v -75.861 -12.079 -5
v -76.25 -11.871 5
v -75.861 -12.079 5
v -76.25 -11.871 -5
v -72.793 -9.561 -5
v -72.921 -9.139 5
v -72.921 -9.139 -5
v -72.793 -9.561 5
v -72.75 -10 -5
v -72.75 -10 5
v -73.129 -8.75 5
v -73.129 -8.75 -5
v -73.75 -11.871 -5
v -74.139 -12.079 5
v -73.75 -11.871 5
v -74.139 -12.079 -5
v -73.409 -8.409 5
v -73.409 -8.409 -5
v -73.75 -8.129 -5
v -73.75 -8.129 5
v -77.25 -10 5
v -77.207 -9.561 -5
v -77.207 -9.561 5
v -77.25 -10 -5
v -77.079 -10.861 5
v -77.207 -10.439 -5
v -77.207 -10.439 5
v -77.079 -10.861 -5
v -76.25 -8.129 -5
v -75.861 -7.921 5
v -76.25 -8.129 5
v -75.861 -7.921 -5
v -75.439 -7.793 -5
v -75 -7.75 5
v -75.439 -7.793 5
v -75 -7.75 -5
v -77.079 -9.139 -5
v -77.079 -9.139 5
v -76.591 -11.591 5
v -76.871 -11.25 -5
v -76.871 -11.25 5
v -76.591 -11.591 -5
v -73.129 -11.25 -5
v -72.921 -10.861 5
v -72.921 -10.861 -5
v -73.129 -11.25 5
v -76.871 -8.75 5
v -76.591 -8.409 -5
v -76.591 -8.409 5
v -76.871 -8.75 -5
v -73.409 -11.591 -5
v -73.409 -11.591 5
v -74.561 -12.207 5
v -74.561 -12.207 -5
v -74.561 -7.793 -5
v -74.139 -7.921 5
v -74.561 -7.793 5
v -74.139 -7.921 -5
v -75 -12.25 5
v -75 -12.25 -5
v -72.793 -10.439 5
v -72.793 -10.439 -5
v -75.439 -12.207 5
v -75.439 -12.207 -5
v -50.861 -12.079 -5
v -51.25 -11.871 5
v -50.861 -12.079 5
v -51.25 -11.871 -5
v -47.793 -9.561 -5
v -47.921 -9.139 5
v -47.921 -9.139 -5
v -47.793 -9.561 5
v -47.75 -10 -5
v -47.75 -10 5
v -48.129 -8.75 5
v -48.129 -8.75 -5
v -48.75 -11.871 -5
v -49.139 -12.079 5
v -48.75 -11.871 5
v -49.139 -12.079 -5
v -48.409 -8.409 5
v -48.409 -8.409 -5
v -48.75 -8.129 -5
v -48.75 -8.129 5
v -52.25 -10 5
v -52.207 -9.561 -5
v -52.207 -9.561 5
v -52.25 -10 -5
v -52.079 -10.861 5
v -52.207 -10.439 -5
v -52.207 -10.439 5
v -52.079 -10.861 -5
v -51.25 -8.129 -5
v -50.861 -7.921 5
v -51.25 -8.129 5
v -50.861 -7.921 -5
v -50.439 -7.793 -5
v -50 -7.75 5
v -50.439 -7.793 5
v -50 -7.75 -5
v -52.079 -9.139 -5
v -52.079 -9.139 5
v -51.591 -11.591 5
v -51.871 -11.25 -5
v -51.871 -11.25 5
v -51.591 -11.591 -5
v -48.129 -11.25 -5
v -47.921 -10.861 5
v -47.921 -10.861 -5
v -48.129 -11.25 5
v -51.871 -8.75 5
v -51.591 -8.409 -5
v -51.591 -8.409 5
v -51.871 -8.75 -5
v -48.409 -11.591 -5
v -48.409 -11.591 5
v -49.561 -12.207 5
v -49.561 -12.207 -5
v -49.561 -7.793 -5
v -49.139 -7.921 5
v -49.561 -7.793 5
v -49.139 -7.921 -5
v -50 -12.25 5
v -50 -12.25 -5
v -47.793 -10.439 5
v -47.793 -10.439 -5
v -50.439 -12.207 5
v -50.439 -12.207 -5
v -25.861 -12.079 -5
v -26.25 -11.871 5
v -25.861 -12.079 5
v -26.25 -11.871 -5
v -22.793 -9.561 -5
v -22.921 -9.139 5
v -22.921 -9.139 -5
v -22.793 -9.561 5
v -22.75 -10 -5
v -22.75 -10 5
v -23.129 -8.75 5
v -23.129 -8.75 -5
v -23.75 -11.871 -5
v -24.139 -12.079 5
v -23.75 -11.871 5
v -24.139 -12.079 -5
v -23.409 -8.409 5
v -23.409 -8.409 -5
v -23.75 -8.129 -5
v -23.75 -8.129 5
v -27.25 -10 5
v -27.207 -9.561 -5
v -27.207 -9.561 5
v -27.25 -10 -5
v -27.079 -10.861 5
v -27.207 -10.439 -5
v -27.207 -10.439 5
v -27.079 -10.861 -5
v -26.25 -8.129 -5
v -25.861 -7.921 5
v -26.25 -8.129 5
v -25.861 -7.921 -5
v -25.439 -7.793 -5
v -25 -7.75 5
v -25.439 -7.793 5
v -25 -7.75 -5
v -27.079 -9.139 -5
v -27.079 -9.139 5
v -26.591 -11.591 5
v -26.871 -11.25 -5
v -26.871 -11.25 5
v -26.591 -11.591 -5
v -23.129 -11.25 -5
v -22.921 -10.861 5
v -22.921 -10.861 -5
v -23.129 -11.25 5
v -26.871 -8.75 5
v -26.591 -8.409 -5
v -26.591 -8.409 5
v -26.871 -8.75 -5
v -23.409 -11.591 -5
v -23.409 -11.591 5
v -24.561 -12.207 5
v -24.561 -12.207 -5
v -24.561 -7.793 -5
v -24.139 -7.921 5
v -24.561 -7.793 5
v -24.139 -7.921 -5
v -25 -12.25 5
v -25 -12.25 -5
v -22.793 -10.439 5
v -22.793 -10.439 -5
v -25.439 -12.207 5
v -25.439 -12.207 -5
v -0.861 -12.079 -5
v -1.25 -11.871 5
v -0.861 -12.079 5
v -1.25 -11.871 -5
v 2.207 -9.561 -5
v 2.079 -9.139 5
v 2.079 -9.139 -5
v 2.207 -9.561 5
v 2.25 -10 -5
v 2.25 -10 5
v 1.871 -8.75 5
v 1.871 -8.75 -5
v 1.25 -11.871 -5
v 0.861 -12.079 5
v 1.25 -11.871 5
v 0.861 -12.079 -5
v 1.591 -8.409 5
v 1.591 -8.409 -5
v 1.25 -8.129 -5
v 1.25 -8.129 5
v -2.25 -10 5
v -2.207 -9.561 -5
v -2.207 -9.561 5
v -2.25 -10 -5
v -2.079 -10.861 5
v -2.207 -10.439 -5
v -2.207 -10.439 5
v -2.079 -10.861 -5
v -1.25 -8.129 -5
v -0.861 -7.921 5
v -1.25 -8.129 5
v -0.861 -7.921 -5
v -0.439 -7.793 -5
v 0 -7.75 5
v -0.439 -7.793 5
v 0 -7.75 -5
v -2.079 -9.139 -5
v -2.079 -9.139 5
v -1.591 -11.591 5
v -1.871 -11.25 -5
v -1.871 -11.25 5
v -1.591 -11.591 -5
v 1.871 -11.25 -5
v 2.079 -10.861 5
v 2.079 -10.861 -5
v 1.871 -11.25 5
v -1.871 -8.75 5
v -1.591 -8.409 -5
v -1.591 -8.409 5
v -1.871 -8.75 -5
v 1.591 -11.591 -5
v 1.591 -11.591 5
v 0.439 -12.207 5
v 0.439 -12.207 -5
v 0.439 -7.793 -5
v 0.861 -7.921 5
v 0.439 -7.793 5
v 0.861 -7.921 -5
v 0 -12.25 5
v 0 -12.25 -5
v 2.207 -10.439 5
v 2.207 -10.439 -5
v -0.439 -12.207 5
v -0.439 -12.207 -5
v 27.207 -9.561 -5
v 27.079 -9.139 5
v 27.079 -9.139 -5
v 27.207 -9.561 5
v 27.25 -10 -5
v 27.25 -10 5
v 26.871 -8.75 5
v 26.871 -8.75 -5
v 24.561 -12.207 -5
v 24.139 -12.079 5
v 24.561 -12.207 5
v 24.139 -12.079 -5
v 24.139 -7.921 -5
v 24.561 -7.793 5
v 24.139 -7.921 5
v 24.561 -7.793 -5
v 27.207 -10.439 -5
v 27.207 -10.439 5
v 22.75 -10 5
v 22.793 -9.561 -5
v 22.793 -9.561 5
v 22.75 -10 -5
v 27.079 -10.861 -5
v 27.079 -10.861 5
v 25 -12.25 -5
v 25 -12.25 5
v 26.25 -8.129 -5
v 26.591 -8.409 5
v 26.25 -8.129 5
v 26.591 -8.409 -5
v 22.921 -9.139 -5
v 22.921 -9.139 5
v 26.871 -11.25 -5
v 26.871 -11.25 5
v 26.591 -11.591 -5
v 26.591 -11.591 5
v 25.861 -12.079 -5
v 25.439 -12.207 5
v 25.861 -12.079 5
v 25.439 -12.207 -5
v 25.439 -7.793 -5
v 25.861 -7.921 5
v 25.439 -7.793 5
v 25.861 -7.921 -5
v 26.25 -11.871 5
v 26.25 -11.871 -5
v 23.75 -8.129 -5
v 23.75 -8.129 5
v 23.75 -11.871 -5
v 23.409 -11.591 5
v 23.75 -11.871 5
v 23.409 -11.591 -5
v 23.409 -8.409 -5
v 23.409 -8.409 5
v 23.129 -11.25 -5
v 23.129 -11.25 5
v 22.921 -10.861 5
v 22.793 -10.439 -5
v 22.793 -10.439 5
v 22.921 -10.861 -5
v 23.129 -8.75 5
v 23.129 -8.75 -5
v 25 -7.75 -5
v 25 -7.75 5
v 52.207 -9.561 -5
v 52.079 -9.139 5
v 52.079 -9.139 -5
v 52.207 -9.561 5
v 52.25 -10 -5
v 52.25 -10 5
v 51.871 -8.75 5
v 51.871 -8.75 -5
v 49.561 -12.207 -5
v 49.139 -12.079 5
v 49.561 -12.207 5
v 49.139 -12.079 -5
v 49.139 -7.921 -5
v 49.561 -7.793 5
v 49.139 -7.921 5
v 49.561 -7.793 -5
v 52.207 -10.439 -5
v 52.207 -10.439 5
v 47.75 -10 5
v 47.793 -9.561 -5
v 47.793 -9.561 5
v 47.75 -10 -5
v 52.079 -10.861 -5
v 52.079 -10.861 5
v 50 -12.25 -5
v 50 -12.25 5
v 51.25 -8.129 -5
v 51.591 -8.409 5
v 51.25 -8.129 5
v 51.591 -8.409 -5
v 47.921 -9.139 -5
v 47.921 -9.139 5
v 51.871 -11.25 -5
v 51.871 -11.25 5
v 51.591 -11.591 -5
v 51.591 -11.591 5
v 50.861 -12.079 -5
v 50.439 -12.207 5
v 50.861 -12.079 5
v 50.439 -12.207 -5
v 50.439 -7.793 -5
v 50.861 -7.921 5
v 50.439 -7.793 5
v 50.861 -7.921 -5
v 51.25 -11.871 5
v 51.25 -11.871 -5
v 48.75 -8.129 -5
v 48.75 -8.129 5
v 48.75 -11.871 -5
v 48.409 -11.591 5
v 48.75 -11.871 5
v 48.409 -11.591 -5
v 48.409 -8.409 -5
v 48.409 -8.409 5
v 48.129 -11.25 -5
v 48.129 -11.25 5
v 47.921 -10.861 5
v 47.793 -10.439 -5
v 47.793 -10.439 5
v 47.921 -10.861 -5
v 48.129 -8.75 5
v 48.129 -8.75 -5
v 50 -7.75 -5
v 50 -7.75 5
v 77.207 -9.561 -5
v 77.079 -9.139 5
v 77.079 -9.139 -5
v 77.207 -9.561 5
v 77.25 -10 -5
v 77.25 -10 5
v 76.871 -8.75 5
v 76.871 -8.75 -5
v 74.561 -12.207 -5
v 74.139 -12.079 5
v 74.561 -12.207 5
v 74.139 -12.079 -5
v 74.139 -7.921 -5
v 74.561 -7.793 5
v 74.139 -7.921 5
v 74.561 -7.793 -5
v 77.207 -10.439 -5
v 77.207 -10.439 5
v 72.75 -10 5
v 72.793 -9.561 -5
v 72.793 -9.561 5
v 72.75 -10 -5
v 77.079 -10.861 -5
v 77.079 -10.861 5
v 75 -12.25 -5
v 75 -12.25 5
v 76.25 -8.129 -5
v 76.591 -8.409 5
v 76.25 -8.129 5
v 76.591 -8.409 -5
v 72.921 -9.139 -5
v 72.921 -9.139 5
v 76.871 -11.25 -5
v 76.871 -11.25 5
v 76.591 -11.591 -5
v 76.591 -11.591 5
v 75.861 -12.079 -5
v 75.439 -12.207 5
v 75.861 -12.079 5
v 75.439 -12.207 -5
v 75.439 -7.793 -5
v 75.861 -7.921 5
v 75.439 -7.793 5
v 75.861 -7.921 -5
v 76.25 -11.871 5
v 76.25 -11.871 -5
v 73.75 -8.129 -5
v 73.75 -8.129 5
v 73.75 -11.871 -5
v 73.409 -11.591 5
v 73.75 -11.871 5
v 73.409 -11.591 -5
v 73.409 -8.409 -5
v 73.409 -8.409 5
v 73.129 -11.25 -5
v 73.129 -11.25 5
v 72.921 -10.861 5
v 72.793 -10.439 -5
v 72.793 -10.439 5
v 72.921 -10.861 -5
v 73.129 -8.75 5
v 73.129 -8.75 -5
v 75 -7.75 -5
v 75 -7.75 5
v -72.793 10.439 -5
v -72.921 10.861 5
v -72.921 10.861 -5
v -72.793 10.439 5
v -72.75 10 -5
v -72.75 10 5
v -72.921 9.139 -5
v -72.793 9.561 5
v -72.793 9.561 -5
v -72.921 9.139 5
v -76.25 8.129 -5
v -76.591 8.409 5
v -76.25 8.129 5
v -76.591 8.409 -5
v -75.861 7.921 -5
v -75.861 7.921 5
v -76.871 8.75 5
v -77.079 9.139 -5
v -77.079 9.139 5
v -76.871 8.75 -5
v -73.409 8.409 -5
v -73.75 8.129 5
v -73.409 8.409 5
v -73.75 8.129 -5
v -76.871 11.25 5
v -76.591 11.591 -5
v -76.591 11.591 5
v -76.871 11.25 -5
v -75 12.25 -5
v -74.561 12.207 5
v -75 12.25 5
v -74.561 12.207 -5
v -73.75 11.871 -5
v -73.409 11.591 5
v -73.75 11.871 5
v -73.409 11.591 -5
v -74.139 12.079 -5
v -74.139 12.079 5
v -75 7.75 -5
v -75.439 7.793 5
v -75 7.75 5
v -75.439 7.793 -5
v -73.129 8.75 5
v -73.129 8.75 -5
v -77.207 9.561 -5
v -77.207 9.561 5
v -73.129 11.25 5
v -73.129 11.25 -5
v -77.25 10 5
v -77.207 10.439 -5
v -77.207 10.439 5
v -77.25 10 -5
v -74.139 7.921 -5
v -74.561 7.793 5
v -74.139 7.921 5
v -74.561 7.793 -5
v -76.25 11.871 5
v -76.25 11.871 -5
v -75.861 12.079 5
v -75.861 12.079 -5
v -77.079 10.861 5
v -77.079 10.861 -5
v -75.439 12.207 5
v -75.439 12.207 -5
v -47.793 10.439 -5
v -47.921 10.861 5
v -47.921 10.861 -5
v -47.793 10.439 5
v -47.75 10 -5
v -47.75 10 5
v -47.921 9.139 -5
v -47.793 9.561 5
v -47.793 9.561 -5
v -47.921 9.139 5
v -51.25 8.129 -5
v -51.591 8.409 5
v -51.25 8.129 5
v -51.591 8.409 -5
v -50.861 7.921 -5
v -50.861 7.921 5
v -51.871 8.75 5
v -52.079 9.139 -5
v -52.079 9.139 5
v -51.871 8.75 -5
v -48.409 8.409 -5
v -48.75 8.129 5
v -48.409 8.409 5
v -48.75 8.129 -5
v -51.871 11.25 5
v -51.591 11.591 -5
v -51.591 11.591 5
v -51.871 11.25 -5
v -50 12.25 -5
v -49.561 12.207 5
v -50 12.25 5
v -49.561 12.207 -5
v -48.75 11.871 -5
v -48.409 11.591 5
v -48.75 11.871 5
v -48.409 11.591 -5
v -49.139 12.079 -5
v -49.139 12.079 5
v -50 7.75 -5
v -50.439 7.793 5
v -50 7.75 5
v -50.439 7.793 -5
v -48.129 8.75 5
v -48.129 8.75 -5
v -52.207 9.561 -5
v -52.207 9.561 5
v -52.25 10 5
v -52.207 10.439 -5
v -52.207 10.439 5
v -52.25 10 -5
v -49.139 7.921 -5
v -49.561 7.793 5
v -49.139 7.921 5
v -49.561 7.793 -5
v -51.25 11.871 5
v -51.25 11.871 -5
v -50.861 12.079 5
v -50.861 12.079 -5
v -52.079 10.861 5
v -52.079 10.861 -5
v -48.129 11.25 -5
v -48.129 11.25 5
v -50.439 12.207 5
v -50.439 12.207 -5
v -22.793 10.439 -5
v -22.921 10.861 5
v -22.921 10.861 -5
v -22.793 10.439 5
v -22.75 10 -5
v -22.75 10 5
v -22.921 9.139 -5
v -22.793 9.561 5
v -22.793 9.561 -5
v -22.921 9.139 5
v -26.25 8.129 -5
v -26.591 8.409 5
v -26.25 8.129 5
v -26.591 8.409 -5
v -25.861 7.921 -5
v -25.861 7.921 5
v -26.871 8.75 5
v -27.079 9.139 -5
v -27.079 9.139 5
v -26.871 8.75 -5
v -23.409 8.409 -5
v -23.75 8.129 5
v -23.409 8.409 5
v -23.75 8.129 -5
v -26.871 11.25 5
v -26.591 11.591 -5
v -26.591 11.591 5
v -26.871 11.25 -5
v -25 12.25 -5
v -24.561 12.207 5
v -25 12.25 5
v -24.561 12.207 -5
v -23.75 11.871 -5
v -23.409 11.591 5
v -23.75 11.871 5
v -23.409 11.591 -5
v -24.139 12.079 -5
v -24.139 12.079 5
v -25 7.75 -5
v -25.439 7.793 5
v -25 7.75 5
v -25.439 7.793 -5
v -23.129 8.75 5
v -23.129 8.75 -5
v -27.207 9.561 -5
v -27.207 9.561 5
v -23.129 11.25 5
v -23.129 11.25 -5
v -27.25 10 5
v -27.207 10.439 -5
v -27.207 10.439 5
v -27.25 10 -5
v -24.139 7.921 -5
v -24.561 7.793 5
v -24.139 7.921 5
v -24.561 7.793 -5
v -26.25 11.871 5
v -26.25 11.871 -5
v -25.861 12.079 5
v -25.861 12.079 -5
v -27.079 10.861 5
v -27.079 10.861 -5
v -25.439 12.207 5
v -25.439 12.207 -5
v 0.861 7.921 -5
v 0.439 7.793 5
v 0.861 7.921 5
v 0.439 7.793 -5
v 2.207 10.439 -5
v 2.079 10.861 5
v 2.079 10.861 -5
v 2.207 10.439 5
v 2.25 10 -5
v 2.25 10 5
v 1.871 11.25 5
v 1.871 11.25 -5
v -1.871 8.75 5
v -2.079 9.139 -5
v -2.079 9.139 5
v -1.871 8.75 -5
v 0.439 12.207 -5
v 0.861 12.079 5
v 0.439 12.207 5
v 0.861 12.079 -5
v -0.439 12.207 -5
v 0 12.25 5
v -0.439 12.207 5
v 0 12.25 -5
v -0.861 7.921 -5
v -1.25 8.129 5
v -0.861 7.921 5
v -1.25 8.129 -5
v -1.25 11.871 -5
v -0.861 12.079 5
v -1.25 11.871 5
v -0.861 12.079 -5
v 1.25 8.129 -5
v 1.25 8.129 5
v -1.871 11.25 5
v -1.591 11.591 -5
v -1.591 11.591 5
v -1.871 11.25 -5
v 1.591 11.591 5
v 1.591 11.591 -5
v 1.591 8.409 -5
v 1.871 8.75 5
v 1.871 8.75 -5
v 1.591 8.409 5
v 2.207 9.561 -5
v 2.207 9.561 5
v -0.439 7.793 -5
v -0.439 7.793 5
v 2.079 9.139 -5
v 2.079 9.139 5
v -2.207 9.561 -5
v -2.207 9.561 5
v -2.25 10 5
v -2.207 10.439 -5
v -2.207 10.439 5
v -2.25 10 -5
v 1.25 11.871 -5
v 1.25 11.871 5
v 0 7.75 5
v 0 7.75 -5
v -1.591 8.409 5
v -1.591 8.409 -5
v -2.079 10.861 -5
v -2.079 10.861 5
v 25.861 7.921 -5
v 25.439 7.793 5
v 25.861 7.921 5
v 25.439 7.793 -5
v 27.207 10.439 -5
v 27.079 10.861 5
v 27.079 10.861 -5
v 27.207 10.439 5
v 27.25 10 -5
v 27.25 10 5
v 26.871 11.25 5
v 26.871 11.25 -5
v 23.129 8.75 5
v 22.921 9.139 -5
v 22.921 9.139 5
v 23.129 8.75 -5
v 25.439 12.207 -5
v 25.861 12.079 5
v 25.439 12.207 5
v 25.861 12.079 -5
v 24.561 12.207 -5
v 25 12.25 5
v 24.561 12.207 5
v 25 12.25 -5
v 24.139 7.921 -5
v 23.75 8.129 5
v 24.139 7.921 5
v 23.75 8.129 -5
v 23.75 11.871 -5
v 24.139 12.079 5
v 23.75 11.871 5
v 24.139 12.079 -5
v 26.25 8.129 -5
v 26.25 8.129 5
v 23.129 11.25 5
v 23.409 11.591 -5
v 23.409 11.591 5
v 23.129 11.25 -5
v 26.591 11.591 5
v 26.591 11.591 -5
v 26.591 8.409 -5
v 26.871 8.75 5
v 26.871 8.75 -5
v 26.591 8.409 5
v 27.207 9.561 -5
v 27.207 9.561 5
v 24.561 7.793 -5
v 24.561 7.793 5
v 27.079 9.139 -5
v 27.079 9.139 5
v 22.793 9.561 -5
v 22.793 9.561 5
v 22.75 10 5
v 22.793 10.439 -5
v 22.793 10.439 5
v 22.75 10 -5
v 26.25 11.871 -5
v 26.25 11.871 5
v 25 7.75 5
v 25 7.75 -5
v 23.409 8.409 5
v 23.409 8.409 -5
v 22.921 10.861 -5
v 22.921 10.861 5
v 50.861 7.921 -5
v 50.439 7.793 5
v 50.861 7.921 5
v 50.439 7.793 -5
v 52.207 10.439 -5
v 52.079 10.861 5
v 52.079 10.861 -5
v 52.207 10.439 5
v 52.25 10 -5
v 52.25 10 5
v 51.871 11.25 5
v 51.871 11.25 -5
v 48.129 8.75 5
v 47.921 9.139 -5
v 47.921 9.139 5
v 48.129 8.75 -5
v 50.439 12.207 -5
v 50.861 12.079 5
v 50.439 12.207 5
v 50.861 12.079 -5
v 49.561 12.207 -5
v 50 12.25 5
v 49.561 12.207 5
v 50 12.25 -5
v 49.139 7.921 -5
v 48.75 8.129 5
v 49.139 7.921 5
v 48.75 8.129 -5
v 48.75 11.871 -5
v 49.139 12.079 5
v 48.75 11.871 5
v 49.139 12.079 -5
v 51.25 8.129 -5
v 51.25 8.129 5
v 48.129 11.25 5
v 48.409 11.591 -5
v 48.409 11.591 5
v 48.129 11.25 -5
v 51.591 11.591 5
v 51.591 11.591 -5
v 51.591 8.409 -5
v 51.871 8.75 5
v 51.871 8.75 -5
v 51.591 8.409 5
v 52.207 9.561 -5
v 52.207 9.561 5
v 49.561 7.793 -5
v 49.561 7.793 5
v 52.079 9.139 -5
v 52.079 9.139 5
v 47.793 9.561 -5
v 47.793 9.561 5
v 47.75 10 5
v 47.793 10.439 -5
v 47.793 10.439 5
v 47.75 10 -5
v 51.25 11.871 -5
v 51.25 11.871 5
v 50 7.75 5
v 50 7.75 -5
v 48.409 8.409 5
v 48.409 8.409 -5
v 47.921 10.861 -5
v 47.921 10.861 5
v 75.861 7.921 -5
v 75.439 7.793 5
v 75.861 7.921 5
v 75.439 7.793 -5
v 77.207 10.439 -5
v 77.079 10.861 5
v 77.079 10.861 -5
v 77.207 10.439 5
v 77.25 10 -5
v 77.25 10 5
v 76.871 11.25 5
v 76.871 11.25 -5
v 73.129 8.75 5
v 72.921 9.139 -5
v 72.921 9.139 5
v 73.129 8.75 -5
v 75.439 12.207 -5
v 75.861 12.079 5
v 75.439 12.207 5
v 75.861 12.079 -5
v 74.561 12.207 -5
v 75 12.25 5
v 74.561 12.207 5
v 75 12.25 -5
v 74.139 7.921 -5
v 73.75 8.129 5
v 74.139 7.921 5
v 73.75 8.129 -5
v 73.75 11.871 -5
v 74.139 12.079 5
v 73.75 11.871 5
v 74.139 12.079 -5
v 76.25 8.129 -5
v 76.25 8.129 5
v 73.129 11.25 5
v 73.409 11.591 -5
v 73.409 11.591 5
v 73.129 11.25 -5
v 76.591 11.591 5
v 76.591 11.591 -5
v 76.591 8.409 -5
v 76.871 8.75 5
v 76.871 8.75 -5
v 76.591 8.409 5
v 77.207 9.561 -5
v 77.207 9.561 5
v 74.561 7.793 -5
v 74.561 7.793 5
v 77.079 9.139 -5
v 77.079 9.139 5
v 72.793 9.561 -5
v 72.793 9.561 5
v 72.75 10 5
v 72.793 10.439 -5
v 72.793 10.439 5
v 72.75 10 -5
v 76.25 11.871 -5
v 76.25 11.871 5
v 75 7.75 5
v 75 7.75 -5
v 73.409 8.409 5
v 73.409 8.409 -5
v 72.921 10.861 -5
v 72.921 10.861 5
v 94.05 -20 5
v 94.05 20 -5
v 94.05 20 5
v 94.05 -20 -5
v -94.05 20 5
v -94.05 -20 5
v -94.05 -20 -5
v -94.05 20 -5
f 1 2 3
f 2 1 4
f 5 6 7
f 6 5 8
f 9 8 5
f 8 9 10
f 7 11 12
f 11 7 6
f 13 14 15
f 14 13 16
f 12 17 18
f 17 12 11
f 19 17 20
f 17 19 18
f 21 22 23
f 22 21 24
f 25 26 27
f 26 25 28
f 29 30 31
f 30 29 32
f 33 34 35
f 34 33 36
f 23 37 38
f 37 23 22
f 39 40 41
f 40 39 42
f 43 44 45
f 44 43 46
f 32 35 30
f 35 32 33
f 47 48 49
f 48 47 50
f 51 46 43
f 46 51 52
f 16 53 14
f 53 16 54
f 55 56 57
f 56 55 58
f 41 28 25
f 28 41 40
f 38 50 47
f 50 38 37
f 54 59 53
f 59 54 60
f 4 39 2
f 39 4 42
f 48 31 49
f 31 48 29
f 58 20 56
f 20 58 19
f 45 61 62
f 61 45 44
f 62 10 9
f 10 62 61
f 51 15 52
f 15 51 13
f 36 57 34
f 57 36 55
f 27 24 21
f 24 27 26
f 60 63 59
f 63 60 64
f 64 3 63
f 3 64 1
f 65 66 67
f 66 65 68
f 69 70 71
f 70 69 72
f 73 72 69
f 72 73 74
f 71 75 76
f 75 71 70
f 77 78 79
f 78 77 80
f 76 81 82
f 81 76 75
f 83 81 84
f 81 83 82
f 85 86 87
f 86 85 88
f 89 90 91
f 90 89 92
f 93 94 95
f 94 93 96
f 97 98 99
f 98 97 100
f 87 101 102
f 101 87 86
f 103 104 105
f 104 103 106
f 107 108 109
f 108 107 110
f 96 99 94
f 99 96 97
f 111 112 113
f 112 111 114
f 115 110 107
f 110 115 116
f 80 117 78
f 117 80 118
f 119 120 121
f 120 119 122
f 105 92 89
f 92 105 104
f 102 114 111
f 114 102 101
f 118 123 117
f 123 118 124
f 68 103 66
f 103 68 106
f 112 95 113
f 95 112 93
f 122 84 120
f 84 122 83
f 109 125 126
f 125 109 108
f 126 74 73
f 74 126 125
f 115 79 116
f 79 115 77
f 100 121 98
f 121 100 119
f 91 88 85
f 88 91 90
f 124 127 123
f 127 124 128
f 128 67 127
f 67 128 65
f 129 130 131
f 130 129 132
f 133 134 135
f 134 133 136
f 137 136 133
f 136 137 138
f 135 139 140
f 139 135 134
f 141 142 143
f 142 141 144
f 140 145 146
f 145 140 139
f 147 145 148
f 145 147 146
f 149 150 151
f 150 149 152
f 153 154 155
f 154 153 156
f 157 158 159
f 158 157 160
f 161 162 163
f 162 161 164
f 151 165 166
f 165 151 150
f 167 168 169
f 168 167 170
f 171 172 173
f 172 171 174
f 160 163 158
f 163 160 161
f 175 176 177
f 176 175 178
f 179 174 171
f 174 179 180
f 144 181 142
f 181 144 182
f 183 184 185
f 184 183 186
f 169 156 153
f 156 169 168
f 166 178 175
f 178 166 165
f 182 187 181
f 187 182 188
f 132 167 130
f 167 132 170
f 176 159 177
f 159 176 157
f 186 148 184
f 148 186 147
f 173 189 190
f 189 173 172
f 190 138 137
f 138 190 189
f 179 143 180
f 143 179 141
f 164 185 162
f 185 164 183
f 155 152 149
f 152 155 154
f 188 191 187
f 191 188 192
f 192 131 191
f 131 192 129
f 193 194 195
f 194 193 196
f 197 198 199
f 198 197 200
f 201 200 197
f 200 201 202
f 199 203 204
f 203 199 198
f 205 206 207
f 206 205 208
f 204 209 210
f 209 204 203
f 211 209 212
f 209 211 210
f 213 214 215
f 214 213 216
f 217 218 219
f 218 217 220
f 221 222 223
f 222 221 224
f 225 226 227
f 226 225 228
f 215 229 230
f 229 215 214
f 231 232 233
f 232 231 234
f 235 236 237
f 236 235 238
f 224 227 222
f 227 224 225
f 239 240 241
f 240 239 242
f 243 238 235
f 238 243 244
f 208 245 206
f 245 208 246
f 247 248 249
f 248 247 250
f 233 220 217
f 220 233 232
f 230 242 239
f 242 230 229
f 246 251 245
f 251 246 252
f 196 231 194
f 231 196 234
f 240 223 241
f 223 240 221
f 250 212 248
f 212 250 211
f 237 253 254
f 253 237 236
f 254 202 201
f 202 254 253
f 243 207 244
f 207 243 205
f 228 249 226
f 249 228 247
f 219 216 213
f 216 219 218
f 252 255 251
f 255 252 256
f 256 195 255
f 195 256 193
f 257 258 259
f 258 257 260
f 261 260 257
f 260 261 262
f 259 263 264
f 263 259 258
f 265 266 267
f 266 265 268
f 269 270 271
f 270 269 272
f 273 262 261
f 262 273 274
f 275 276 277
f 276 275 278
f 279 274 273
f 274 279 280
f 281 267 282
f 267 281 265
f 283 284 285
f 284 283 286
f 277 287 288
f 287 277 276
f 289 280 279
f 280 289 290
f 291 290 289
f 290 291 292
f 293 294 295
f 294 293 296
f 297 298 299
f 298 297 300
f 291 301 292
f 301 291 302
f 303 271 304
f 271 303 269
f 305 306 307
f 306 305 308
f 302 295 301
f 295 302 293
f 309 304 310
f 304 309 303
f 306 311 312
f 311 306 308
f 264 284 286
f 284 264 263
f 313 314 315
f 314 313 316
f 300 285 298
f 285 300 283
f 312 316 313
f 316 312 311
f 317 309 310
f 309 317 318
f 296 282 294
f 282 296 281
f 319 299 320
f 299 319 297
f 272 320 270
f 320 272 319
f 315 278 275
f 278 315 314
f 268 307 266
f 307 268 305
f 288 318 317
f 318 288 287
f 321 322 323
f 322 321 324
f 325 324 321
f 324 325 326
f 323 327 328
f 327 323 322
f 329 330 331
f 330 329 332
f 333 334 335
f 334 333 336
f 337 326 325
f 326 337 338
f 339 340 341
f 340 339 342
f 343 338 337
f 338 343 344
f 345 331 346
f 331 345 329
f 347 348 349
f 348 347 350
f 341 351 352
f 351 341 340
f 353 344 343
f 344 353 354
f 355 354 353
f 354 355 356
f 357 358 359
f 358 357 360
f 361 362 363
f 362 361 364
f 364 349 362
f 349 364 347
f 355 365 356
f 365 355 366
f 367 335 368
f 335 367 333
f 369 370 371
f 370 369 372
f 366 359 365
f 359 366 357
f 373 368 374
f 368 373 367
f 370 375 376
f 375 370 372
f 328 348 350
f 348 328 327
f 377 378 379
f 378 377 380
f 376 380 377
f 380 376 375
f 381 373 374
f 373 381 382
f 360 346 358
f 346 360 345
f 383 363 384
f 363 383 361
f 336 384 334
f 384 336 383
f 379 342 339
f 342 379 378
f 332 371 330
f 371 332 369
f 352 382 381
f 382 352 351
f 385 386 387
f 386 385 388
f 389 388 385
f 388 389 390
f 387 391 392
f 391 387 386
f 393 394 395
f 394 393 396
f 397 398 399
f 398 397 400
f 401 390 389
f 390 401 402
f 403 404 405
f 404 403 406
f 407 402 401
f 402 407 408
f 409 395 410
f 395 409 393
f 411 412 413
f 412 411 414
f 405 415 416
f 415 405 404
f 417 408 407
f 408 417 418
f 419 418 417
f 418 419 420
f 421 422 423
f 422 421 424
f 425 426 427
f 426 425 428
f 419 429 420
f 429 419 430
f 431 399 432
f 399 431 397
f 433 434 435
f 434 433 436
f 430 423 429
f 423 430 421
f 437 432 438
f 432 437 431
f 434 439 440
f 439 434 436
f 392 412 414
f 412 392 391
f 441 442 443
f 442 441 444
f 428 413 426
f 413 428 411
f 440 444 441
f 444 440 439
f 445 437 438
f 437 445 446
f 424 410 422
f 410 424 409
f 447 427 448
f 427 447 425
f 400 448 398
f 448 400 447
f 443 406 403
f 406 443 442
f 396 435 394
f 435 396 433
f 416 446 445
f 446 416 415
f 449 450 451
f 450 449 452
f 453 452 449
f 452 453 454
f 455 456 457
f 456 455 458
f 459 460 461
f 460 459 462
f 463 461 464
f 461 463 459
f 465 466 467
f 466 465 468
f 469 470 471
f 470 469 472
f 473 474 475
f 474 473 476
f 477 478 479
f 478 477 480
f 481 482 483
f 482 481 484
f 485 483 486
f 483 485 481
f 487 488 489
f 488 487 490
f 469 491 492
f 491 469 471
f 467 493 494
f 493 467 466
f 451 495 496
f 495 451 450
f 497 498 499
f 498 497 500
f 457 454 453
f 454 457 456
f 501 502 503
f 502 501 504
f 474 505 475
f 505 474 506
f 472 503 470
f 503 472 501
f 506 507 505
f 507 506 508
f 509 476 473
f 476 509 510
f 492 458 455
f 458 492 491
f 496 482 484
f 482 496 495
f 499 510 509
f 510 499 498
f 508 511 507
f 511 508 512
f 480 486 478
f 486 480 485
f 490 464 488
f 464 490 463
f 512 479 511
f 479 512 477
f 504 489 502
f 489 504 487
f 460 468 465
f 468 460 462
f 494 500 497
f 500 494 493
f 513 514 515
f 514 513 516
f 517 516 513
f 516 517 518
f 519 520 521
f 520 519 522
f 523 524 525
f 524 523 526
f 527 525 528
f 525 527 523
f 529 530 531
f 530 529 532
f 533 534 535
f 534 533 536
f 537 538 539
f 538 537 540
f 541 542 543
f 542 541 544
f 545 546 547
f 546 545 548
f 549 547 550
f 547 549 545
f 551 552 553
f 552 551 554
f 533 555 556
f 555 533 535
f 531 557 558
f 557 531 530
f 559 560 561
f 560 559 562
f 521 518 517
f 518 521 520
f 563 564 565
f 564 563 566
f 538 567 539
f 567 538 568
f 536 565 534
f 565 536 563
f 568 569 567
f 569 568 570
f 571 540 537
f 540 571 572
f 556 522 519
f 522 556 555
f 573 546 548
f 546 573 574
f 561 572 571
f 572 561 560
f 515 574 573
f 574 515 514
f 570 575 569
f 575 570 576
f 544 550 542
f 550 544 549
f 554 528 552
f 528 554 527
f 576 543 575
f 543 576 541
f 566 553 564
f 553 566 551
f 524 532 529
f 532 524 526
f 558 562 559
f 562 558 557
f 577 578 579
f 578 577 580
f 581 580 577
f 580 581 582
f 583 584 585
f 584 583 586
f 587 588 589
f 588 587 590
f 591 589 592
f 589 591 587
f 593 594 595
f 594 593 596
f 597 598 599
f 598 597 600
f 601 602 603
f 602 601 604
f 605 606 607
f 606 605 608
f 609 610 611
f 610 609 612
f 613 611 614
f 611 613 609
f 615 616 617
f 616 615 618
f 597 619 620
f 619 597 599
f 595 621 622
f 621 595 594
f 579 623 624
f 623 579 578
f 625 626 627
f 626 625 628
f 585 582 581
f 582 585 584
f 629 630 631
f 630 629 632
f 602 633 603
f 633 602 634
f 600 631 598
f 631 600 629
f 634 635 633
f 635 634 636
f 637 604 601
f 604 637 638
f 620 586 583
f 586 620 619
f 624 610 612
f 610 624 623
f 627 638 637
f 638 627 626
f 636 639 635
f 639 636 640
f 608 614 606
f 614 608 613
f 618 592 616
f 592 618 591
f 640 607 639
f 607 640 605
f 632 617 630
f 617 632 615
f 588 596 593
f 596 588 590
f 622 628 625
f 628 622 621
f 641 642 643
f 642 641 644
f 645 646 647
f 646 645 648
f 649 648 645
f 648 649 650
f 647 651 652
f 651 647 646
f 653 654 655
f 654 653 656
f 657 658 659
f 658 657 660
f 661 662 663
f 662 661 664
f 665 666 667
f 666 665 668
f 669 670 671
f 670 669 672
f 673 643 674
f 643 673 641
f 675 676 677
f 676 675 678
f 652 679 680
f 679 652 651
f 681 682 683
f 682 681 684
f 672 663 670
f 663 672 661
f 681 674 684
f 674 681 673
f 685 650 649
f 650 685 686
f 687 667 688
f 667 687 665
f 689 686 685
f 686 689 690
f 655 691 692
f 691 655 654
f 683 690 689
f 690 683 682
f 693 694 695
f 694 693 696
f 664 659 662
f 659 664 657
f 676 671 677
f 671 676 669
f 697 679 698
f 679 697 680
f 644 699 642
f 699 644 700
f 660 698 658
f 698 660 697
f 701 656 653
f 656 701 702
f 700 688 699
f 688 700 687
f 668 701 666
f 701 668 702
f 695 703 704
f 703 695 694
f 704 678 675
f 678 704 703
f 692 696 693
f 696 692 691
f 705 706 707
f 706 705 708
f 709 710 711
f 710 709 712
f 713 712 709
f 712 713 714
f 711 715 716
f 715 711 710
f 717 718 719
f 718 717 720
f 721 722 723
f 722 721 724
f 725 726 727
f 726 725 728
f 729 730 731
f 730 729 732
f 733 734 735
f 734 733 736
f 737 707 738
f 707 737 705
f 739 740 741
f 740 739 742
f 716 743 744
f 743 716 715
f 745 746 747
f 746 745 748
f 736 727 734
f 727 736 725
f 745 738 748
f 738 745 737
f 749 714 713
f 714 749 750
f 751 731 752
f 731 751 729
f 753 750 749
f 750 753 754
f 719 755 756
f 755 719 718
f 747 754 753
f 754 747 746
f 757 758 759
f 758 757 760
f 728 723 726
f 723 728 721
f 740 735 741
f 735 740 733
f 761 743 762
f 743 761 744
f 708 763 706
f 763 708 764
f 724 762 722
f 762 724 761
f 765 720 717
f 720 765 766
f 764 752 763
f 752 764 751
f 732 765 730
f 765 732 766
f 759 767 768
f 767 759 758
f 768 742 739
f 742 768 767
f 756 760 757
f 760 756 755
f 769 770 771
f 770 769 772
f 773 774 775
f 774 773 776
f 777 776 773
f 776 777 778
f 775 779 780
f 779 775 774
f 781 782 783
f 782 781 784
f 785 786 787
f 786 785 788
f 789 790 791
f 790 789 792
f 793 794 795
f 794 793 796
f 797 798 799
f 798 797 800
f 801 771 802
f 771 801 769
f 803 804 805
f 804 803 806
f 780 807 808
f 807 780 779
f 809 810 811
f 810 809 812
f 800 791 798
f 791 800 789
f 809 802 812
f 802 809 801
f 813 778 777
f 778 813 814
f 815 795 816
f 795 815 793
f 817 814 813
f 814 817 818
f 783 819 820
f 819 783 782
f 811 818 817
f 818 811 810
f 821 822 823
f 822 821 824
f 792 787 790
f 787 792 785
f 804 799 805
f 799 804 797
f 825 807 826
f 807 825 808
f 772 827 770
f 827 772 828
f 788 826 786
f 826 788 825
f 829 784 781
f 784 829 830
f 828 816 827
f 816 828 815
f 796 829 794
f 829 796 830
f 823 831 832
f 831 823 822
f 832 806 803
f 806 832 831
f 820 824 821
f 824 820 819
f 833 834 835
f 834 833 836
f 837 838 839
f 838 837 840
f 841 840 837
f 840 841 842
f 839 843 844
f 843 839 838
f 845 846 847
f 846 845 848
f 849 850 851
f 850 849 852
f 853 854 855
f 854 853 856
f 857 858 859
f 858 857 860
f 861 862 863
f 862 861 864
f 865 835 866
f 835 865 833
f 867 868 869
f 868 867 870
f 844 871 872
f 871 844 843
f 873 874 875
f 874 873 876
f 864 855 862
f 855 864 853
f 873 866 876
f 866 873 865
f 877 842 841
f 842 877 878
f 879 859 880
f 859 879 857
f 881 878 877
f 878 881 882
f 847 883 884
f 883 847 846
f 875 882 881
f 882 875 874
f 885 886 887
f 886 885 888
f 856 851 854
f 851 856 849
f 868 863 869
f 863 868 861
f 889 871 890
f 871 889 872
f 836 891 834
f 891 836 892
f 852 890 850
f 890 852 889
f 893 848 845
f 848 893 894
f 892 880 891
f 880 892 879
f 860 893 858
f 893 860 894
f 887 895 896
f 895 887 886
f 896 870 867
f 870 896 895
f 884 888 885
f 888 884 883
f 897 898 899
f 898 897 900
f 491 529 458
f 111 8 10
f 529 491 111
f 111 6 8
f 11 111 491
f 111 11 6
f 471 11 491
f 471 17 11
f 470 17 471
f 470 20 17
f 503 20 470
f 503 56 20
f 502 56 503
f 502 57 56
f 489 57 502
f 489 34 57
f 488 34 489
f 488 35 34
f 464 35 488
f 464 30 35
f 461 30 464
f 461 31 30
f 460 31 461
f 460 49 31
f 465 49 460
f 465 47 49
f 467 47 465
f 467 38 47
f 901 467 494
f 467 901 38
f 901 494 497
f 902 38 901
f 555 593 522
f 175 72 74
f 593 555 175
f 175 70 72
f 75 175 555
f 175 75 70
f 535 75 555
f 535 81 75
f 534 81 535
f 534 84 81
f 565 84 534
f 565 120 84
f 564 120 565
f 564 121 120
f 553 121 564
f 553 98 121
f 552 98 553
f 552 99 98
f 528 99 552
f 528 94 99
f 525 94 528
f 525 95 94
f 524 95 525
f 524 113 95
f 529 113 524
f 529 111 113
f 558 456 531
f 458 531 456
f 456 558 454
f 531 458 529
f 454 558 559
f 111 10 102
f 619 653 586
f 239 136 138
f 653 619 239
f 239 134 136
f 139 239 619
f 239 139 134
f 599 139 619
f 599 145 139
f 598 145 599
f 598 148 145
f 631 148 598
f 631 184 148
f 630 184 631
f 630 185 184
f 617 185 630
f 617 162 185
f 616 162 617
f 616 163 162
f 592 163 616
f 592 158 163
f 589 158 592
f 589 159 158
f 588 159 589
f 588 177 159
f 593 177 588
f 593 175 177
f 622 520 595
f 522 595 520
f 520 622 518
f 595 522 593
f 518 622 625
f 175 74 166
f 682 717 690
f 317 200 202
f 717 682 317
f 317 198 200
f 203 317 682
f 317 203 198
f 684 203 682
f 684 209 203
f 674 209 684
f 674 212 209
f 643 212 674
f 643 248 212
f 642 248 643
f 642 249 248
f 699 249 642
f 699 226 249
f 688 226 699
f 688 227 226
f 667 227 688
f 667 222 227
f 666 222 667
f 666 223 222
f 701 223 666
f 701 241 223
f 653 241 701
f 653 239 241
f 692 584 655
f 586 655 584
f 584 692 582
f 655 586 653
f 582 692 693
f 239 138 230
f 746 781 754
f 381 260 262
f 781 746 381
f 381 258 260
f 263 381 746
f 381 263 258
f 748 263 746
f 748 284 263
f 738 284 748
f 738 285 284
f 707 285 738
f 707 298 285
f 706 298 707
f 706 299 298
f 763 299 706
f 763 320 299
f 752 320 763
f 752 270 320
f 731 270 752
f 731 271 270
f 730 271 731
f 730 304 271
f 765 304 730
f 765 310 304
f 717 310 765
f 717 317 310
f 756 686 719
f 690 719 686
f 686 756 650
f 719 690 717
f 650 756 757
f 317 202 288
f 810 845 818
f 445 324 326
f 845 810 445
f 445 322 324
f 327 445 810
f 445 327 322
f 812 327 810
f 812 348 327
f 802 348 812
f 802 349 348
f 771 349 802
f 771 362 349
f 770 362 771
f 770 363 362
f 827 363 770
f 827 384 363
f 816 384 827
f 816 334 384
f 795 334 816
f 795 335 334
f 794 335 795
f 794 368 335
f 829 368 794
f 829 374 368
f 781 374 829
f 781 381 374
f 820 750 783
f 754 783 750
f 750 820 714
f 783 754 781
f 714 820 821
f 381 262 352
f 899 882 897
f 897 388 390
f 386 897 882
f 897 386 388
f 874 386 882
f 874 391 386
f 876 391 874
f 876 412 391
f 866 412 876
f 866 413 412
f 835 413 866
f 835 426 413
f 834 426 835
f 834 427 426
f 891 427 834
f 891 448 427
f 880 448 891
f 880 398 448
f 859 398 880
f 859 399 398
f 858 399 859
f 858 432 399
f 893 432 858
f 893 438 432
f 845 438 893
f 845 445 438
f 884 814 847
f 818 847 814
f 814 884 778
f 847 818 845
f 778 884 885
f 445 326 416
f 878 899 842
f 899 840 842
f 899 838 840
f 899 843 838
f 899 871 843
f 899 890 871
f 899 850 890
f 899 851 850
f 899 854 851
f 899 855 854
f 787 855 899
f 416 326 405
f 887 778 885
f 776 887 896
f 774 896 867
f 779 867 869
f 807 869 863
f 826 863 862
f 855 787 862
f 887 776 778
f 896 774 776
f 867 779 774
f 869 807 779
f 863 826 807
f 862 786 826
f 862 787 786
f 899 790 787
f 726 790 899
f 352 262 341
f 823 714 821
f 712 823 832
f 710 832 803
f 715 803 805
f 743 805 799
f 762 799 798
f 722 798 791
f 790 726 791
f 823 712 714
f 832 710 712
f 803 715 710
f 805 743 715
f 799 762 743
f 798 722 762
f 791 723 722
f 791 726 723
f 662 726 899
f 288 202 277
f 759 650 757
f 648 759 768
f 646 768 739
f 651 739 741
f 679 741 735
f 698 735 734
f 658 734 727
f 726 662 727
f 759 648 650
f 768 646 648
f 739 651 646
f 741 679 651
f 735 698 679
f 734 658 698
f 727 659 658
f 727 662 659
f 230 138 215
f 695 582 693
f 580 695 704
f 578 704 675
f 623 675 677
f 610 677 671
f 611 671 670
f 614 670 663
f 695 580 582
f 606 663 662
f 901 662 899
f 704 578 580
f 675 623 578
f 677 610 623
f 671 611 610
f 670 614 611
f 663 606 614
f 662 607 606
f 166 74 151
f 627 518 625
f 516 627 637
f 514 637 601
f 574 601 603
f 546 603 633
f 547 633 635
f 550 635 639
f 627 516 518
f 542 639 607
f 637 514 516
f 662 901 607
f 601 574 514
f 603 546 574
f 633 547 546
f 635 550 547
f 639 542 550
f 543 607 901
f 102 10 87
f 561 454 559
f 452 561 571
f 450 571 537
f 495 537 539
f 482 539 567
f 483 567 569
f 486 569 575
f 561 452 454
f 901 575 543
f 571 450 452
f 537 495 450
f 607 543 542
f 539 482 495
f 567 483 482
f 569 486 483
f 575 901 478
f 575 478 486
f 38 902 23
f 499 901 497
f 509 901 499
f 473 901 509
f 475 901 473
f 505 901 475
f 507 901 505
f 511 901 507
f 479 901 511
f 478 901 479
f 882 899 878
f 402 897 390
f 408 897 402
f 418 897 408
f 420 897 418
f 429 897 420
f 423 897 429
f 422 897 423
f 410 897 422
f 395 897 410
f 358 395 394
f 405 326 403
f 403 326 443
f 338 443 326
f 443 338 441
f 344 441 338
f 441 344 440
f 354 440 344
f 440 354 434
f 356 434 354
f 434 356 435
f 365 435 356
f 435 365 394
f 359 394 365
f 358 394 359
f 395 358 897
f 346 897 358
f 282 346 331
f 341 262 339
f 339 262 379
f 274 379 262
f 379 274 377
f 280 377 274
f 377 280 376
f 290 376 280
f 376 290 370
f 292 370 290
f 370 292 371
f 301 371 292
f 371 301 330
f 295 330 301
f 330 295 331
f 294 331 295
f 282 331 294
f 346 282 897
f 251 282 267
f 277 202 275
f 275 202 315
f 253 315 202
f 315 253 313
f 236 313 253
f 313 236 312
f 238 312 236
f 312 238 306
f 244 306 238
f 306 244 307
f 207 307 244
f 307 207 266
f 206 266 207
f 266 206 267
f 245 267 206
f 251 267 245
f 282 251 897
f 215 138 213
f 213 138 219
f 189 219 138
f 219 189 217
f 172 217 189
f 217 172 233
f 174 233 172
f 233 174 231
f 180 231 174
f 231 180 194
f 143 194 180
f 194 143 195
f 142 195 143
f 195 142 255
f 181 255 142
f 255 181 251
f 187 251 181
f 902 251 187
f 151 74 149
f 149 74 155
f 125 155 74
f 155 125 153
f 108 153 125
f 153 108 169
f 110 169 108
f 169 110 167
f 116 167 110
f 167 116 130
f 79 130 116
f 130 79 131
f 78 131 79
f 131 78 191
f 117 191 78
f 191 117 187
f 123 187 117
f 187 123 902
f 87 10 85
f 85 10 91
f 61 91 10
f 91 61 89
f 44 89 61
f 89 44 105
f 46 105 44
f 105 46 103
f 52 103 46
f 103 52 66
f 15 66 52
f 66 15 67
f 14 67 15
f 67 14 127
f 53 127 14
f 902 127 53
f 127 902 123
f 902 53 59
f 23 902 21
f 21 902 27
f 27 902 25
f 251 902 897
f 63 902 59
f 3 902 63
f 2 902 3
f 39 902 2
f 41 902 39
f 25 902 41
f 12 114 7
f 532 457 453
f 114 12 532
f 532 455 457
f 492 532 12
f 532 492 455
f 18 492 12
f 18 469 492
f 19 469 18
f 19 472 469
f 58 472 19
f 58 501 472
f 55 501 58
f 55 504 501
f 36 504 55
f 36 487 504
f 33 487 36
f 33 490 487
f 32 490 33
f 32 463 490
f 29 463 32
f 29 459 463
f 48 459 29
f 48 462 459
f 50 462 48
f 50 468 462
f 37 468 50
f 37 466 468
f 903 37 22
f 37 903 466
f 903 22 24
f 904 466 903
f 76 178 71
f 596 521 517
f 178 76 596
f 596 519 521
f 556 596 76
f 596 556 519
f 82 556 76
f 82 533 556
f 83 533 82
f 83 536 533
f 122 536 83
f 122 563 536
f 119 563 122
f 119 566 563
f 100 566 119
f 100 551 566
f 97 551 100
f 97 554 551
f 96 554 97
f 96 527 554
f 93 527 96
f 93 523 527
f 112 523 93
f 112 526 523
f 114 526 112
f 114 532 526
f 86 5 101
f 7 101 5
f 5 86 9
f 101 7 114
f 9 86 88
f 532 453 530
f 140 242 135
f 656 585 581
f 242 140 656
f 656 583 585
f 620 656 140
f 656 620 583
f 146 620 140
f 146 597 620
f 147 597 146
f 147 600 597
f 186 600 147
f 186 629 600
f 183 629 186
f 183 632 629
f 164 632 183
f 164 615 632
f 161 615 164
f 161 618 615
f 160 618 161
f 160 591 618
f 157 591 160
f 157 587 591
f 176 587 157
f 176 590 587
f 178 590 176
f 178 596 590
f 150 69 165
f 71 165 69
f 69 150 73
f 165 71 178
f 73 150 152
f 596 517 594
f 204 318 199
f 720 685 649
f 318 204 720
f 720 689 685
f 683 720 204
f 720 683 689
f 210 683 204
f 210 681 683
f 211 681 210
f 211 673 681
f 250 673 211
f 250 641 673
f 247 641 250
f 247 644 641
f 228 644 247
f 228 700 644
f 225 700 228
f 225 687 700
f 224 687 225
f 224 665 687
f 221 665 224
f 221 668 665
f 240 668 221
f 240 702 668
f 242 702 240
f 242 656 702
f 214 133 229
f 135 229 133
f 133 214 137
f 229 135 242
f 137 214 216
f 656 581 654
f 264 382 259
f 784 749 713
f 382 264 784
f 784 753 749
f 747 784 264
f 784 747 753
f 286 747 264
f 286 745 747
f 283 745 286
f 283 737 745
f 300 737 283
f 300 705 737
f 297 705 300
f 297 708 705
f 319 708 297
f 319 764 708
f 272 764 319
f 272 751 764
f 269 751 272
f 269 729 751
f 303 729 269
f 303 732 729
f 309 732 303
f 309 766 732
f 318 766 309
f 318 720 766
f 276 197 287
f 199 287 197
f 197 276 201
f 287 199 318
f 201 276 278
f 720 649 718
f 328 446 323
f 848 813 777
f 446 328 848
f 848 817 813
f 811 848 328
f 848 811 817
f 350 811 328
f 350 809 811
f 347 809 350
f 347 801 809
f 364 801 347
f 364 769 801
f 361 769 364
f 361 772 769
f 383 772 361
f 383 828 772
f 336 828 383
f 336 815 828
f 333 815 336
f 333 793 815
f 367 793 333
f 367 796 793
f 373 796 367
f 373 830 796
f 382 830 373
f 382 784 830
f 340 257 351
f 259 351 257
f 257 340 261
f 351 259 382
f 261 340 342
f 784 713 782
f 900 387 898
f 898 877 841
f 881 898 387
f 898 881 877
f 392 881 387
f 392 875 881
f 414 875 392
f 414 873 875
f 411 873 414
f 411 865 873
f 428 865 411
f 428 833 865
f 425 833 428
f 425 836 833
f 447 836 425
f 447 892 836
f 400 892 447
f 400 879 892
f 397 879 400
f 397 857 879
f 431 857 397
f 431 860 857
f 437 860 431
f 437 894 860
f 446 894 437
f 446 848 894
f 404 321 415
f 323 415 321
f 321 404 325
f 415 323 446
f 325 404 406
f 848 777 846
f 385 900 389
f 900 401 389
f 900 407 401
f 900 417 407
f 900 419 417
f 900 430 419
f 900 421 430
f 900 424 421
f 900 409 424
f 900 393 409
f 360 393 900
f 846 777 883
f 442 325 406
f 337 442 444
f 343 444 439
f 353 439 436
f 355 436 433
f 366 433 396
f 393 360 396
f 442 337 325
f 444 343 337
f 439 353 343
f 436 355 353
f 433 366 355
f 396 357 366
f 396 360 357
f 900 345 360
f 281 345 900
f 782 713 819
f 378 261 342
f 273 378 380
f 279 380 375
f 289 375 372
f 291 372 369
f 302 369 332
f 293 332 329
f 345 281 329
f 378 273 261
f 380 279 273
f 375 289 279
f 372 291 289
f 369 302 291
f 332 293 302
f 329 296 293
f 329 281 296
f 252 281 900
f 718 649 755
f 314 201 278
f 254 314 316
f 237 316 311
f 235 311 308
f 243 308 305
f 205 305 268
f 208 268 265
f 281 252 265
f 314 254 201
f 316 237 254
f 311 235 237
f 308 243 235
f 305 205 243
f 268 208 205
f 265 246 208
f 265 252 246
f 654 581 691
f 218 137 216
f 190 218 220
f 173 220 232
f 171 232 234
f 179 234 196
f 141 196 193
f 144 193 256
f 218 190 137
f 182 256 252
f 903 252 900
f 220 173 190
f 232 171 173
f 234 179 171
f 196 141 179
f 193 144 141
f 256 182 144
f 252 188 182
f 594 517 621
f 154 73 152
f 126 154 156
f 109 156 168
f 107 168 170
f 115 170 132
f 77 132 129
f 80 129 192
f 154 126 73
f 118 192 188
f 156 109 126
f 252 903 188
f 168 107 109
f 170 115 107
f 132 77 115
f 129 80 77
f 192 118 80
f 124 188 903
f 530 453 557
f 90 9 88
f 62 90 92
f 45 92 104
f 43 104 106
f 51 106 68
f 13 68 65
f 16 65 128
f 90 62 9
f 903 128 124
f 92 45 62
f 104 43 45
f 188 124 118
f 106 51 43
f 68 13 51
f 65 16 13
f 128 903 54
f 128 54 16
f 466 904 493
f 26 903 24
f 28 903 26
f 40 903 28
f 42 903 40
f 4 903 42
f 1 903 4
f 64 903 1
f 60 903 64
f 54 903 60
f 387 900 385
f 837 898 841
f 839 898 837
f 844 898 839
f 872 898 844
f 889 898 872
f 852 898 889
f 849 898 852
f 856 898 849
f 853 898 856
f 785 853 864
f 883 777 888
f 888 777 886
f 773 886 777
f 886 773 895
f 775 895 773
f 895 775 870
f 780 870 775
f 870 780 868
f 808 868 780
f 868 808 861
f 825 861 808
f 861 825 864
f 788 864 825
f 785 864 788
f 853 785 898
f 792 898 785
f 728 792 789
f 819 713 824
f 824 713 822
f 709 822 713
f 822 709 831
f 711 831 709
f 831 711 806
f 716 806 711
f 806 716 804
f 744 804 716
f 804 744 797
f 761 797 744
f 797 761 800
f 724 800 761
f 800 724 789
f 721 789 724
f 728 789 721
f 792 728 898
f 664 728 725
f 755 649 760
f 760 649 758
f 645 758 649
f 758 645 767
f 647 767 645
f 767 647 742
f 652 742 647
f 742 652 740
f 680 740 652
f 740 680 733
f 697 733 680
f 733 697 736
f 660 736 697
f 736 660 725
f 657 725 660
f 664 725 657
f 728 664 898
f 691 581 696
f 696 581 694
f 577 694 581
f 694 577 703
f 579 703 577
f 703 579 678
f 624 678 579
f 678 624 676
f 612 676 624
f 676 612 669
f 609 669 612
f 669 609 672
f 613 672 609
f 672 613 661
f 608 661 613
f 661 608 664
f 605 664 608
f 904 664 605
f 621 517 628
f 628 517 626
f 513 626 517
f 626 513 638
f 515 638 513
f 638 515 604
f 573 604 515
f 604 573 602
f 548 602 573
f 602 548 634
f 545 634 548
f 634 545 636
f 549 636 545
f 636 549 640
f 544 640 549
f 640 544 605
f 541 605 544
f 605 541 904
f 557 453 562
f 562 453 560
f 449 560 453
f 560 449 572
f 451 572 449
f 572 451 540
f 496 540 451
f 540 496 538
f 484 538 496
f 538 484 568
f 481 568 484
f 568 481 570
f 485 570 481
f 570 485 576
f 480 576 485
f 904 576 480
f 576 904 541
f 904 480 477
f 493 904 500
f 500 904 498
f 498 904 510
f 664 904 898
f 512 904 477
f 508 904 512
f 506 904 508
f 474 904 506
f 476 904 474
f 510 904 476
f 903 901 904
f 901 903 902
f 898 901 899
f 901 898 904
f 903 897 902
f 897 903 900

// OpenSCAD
$fn = 32;

// ----------------------------------------------------------------------
// Hole bar, 7 x Ø4.5
// tworows layout, 19.05 mm edge offset
// ----------------------------------------------------------------------

// --- parameters (mm) ---
bar_w = 40;       // bar width (Y)
seat_tol = 0.1;   // tolerance at the seating features
free_tol = 0.3;   // general tolerance on the free sizes
bar_t = 10;       // bar thickness (Z)
holes = 7;        // holes per row
hole_d = 4.5;     // hole diameter
edge = 19.05;     // offset from the bar end to the first hole
pitch = 25;       // pitch between neighbouring holes
row_offset = 20;  // distance between the two rows

// --- derived feature positions (mm) ---
span = (holes - 1) * pitch;   // = 150   distance between the end holes
bar_l = span + 2 * edge;      // = 188.1   overall bar length
start_x = -bar_l / 2 + edge;  // = -75   X of the first hole
feature_centers = [
  [start_x + 0 * pitch, -row_offset / 2],
  [start_x + 1 * pitch, -row_offset / 2],
  [start_x + 2 * pitch, -row_offset / 2],
  [start_x + 3 * pitch, -row_offset / 2],
  [start_x + 4 * pitch, -row_offset / 2],
  [start_x + 5 * pitch, -row_offset / 2],
  [start_x + 6 * pitch, -row_offset / 2]
];   // hole centres of the first row
row2_centers = [
  [start_x + 0 * pitch, row_offset / 2],
  [start_x + 1 * pitch, row_offset / 2],
  [start_x + 2 * pitch, row_offset / 2],
  [start_x + 3 * pitch, row_offset / 2],
  [start_x + 4 * pitch, row_offset / 2],
  [start_x + 5 * pitch, row_offset / 2],
  [start_x + 6 * pitch, row_offset / 2]
];   // hole centres of the second row

// bar with two rows of holes, both read from their own centre arrays
difference() {
  translate([-bar_l / 2, -bar_w / 2, -bar_t / 2]) cube([bar_l, bar_w, bar_t]);
  for (centre = feature_centers)
    translate([centre[0], centre[1], 0])
      cylinder(d = hole_d, h = bar_t + 2, center = true);
  for (centre = row2_centers)
    translate([centre[0], centre[1], 0])
      cylinder(d = hole_d, h = bar_t + 2, center = true);
}
